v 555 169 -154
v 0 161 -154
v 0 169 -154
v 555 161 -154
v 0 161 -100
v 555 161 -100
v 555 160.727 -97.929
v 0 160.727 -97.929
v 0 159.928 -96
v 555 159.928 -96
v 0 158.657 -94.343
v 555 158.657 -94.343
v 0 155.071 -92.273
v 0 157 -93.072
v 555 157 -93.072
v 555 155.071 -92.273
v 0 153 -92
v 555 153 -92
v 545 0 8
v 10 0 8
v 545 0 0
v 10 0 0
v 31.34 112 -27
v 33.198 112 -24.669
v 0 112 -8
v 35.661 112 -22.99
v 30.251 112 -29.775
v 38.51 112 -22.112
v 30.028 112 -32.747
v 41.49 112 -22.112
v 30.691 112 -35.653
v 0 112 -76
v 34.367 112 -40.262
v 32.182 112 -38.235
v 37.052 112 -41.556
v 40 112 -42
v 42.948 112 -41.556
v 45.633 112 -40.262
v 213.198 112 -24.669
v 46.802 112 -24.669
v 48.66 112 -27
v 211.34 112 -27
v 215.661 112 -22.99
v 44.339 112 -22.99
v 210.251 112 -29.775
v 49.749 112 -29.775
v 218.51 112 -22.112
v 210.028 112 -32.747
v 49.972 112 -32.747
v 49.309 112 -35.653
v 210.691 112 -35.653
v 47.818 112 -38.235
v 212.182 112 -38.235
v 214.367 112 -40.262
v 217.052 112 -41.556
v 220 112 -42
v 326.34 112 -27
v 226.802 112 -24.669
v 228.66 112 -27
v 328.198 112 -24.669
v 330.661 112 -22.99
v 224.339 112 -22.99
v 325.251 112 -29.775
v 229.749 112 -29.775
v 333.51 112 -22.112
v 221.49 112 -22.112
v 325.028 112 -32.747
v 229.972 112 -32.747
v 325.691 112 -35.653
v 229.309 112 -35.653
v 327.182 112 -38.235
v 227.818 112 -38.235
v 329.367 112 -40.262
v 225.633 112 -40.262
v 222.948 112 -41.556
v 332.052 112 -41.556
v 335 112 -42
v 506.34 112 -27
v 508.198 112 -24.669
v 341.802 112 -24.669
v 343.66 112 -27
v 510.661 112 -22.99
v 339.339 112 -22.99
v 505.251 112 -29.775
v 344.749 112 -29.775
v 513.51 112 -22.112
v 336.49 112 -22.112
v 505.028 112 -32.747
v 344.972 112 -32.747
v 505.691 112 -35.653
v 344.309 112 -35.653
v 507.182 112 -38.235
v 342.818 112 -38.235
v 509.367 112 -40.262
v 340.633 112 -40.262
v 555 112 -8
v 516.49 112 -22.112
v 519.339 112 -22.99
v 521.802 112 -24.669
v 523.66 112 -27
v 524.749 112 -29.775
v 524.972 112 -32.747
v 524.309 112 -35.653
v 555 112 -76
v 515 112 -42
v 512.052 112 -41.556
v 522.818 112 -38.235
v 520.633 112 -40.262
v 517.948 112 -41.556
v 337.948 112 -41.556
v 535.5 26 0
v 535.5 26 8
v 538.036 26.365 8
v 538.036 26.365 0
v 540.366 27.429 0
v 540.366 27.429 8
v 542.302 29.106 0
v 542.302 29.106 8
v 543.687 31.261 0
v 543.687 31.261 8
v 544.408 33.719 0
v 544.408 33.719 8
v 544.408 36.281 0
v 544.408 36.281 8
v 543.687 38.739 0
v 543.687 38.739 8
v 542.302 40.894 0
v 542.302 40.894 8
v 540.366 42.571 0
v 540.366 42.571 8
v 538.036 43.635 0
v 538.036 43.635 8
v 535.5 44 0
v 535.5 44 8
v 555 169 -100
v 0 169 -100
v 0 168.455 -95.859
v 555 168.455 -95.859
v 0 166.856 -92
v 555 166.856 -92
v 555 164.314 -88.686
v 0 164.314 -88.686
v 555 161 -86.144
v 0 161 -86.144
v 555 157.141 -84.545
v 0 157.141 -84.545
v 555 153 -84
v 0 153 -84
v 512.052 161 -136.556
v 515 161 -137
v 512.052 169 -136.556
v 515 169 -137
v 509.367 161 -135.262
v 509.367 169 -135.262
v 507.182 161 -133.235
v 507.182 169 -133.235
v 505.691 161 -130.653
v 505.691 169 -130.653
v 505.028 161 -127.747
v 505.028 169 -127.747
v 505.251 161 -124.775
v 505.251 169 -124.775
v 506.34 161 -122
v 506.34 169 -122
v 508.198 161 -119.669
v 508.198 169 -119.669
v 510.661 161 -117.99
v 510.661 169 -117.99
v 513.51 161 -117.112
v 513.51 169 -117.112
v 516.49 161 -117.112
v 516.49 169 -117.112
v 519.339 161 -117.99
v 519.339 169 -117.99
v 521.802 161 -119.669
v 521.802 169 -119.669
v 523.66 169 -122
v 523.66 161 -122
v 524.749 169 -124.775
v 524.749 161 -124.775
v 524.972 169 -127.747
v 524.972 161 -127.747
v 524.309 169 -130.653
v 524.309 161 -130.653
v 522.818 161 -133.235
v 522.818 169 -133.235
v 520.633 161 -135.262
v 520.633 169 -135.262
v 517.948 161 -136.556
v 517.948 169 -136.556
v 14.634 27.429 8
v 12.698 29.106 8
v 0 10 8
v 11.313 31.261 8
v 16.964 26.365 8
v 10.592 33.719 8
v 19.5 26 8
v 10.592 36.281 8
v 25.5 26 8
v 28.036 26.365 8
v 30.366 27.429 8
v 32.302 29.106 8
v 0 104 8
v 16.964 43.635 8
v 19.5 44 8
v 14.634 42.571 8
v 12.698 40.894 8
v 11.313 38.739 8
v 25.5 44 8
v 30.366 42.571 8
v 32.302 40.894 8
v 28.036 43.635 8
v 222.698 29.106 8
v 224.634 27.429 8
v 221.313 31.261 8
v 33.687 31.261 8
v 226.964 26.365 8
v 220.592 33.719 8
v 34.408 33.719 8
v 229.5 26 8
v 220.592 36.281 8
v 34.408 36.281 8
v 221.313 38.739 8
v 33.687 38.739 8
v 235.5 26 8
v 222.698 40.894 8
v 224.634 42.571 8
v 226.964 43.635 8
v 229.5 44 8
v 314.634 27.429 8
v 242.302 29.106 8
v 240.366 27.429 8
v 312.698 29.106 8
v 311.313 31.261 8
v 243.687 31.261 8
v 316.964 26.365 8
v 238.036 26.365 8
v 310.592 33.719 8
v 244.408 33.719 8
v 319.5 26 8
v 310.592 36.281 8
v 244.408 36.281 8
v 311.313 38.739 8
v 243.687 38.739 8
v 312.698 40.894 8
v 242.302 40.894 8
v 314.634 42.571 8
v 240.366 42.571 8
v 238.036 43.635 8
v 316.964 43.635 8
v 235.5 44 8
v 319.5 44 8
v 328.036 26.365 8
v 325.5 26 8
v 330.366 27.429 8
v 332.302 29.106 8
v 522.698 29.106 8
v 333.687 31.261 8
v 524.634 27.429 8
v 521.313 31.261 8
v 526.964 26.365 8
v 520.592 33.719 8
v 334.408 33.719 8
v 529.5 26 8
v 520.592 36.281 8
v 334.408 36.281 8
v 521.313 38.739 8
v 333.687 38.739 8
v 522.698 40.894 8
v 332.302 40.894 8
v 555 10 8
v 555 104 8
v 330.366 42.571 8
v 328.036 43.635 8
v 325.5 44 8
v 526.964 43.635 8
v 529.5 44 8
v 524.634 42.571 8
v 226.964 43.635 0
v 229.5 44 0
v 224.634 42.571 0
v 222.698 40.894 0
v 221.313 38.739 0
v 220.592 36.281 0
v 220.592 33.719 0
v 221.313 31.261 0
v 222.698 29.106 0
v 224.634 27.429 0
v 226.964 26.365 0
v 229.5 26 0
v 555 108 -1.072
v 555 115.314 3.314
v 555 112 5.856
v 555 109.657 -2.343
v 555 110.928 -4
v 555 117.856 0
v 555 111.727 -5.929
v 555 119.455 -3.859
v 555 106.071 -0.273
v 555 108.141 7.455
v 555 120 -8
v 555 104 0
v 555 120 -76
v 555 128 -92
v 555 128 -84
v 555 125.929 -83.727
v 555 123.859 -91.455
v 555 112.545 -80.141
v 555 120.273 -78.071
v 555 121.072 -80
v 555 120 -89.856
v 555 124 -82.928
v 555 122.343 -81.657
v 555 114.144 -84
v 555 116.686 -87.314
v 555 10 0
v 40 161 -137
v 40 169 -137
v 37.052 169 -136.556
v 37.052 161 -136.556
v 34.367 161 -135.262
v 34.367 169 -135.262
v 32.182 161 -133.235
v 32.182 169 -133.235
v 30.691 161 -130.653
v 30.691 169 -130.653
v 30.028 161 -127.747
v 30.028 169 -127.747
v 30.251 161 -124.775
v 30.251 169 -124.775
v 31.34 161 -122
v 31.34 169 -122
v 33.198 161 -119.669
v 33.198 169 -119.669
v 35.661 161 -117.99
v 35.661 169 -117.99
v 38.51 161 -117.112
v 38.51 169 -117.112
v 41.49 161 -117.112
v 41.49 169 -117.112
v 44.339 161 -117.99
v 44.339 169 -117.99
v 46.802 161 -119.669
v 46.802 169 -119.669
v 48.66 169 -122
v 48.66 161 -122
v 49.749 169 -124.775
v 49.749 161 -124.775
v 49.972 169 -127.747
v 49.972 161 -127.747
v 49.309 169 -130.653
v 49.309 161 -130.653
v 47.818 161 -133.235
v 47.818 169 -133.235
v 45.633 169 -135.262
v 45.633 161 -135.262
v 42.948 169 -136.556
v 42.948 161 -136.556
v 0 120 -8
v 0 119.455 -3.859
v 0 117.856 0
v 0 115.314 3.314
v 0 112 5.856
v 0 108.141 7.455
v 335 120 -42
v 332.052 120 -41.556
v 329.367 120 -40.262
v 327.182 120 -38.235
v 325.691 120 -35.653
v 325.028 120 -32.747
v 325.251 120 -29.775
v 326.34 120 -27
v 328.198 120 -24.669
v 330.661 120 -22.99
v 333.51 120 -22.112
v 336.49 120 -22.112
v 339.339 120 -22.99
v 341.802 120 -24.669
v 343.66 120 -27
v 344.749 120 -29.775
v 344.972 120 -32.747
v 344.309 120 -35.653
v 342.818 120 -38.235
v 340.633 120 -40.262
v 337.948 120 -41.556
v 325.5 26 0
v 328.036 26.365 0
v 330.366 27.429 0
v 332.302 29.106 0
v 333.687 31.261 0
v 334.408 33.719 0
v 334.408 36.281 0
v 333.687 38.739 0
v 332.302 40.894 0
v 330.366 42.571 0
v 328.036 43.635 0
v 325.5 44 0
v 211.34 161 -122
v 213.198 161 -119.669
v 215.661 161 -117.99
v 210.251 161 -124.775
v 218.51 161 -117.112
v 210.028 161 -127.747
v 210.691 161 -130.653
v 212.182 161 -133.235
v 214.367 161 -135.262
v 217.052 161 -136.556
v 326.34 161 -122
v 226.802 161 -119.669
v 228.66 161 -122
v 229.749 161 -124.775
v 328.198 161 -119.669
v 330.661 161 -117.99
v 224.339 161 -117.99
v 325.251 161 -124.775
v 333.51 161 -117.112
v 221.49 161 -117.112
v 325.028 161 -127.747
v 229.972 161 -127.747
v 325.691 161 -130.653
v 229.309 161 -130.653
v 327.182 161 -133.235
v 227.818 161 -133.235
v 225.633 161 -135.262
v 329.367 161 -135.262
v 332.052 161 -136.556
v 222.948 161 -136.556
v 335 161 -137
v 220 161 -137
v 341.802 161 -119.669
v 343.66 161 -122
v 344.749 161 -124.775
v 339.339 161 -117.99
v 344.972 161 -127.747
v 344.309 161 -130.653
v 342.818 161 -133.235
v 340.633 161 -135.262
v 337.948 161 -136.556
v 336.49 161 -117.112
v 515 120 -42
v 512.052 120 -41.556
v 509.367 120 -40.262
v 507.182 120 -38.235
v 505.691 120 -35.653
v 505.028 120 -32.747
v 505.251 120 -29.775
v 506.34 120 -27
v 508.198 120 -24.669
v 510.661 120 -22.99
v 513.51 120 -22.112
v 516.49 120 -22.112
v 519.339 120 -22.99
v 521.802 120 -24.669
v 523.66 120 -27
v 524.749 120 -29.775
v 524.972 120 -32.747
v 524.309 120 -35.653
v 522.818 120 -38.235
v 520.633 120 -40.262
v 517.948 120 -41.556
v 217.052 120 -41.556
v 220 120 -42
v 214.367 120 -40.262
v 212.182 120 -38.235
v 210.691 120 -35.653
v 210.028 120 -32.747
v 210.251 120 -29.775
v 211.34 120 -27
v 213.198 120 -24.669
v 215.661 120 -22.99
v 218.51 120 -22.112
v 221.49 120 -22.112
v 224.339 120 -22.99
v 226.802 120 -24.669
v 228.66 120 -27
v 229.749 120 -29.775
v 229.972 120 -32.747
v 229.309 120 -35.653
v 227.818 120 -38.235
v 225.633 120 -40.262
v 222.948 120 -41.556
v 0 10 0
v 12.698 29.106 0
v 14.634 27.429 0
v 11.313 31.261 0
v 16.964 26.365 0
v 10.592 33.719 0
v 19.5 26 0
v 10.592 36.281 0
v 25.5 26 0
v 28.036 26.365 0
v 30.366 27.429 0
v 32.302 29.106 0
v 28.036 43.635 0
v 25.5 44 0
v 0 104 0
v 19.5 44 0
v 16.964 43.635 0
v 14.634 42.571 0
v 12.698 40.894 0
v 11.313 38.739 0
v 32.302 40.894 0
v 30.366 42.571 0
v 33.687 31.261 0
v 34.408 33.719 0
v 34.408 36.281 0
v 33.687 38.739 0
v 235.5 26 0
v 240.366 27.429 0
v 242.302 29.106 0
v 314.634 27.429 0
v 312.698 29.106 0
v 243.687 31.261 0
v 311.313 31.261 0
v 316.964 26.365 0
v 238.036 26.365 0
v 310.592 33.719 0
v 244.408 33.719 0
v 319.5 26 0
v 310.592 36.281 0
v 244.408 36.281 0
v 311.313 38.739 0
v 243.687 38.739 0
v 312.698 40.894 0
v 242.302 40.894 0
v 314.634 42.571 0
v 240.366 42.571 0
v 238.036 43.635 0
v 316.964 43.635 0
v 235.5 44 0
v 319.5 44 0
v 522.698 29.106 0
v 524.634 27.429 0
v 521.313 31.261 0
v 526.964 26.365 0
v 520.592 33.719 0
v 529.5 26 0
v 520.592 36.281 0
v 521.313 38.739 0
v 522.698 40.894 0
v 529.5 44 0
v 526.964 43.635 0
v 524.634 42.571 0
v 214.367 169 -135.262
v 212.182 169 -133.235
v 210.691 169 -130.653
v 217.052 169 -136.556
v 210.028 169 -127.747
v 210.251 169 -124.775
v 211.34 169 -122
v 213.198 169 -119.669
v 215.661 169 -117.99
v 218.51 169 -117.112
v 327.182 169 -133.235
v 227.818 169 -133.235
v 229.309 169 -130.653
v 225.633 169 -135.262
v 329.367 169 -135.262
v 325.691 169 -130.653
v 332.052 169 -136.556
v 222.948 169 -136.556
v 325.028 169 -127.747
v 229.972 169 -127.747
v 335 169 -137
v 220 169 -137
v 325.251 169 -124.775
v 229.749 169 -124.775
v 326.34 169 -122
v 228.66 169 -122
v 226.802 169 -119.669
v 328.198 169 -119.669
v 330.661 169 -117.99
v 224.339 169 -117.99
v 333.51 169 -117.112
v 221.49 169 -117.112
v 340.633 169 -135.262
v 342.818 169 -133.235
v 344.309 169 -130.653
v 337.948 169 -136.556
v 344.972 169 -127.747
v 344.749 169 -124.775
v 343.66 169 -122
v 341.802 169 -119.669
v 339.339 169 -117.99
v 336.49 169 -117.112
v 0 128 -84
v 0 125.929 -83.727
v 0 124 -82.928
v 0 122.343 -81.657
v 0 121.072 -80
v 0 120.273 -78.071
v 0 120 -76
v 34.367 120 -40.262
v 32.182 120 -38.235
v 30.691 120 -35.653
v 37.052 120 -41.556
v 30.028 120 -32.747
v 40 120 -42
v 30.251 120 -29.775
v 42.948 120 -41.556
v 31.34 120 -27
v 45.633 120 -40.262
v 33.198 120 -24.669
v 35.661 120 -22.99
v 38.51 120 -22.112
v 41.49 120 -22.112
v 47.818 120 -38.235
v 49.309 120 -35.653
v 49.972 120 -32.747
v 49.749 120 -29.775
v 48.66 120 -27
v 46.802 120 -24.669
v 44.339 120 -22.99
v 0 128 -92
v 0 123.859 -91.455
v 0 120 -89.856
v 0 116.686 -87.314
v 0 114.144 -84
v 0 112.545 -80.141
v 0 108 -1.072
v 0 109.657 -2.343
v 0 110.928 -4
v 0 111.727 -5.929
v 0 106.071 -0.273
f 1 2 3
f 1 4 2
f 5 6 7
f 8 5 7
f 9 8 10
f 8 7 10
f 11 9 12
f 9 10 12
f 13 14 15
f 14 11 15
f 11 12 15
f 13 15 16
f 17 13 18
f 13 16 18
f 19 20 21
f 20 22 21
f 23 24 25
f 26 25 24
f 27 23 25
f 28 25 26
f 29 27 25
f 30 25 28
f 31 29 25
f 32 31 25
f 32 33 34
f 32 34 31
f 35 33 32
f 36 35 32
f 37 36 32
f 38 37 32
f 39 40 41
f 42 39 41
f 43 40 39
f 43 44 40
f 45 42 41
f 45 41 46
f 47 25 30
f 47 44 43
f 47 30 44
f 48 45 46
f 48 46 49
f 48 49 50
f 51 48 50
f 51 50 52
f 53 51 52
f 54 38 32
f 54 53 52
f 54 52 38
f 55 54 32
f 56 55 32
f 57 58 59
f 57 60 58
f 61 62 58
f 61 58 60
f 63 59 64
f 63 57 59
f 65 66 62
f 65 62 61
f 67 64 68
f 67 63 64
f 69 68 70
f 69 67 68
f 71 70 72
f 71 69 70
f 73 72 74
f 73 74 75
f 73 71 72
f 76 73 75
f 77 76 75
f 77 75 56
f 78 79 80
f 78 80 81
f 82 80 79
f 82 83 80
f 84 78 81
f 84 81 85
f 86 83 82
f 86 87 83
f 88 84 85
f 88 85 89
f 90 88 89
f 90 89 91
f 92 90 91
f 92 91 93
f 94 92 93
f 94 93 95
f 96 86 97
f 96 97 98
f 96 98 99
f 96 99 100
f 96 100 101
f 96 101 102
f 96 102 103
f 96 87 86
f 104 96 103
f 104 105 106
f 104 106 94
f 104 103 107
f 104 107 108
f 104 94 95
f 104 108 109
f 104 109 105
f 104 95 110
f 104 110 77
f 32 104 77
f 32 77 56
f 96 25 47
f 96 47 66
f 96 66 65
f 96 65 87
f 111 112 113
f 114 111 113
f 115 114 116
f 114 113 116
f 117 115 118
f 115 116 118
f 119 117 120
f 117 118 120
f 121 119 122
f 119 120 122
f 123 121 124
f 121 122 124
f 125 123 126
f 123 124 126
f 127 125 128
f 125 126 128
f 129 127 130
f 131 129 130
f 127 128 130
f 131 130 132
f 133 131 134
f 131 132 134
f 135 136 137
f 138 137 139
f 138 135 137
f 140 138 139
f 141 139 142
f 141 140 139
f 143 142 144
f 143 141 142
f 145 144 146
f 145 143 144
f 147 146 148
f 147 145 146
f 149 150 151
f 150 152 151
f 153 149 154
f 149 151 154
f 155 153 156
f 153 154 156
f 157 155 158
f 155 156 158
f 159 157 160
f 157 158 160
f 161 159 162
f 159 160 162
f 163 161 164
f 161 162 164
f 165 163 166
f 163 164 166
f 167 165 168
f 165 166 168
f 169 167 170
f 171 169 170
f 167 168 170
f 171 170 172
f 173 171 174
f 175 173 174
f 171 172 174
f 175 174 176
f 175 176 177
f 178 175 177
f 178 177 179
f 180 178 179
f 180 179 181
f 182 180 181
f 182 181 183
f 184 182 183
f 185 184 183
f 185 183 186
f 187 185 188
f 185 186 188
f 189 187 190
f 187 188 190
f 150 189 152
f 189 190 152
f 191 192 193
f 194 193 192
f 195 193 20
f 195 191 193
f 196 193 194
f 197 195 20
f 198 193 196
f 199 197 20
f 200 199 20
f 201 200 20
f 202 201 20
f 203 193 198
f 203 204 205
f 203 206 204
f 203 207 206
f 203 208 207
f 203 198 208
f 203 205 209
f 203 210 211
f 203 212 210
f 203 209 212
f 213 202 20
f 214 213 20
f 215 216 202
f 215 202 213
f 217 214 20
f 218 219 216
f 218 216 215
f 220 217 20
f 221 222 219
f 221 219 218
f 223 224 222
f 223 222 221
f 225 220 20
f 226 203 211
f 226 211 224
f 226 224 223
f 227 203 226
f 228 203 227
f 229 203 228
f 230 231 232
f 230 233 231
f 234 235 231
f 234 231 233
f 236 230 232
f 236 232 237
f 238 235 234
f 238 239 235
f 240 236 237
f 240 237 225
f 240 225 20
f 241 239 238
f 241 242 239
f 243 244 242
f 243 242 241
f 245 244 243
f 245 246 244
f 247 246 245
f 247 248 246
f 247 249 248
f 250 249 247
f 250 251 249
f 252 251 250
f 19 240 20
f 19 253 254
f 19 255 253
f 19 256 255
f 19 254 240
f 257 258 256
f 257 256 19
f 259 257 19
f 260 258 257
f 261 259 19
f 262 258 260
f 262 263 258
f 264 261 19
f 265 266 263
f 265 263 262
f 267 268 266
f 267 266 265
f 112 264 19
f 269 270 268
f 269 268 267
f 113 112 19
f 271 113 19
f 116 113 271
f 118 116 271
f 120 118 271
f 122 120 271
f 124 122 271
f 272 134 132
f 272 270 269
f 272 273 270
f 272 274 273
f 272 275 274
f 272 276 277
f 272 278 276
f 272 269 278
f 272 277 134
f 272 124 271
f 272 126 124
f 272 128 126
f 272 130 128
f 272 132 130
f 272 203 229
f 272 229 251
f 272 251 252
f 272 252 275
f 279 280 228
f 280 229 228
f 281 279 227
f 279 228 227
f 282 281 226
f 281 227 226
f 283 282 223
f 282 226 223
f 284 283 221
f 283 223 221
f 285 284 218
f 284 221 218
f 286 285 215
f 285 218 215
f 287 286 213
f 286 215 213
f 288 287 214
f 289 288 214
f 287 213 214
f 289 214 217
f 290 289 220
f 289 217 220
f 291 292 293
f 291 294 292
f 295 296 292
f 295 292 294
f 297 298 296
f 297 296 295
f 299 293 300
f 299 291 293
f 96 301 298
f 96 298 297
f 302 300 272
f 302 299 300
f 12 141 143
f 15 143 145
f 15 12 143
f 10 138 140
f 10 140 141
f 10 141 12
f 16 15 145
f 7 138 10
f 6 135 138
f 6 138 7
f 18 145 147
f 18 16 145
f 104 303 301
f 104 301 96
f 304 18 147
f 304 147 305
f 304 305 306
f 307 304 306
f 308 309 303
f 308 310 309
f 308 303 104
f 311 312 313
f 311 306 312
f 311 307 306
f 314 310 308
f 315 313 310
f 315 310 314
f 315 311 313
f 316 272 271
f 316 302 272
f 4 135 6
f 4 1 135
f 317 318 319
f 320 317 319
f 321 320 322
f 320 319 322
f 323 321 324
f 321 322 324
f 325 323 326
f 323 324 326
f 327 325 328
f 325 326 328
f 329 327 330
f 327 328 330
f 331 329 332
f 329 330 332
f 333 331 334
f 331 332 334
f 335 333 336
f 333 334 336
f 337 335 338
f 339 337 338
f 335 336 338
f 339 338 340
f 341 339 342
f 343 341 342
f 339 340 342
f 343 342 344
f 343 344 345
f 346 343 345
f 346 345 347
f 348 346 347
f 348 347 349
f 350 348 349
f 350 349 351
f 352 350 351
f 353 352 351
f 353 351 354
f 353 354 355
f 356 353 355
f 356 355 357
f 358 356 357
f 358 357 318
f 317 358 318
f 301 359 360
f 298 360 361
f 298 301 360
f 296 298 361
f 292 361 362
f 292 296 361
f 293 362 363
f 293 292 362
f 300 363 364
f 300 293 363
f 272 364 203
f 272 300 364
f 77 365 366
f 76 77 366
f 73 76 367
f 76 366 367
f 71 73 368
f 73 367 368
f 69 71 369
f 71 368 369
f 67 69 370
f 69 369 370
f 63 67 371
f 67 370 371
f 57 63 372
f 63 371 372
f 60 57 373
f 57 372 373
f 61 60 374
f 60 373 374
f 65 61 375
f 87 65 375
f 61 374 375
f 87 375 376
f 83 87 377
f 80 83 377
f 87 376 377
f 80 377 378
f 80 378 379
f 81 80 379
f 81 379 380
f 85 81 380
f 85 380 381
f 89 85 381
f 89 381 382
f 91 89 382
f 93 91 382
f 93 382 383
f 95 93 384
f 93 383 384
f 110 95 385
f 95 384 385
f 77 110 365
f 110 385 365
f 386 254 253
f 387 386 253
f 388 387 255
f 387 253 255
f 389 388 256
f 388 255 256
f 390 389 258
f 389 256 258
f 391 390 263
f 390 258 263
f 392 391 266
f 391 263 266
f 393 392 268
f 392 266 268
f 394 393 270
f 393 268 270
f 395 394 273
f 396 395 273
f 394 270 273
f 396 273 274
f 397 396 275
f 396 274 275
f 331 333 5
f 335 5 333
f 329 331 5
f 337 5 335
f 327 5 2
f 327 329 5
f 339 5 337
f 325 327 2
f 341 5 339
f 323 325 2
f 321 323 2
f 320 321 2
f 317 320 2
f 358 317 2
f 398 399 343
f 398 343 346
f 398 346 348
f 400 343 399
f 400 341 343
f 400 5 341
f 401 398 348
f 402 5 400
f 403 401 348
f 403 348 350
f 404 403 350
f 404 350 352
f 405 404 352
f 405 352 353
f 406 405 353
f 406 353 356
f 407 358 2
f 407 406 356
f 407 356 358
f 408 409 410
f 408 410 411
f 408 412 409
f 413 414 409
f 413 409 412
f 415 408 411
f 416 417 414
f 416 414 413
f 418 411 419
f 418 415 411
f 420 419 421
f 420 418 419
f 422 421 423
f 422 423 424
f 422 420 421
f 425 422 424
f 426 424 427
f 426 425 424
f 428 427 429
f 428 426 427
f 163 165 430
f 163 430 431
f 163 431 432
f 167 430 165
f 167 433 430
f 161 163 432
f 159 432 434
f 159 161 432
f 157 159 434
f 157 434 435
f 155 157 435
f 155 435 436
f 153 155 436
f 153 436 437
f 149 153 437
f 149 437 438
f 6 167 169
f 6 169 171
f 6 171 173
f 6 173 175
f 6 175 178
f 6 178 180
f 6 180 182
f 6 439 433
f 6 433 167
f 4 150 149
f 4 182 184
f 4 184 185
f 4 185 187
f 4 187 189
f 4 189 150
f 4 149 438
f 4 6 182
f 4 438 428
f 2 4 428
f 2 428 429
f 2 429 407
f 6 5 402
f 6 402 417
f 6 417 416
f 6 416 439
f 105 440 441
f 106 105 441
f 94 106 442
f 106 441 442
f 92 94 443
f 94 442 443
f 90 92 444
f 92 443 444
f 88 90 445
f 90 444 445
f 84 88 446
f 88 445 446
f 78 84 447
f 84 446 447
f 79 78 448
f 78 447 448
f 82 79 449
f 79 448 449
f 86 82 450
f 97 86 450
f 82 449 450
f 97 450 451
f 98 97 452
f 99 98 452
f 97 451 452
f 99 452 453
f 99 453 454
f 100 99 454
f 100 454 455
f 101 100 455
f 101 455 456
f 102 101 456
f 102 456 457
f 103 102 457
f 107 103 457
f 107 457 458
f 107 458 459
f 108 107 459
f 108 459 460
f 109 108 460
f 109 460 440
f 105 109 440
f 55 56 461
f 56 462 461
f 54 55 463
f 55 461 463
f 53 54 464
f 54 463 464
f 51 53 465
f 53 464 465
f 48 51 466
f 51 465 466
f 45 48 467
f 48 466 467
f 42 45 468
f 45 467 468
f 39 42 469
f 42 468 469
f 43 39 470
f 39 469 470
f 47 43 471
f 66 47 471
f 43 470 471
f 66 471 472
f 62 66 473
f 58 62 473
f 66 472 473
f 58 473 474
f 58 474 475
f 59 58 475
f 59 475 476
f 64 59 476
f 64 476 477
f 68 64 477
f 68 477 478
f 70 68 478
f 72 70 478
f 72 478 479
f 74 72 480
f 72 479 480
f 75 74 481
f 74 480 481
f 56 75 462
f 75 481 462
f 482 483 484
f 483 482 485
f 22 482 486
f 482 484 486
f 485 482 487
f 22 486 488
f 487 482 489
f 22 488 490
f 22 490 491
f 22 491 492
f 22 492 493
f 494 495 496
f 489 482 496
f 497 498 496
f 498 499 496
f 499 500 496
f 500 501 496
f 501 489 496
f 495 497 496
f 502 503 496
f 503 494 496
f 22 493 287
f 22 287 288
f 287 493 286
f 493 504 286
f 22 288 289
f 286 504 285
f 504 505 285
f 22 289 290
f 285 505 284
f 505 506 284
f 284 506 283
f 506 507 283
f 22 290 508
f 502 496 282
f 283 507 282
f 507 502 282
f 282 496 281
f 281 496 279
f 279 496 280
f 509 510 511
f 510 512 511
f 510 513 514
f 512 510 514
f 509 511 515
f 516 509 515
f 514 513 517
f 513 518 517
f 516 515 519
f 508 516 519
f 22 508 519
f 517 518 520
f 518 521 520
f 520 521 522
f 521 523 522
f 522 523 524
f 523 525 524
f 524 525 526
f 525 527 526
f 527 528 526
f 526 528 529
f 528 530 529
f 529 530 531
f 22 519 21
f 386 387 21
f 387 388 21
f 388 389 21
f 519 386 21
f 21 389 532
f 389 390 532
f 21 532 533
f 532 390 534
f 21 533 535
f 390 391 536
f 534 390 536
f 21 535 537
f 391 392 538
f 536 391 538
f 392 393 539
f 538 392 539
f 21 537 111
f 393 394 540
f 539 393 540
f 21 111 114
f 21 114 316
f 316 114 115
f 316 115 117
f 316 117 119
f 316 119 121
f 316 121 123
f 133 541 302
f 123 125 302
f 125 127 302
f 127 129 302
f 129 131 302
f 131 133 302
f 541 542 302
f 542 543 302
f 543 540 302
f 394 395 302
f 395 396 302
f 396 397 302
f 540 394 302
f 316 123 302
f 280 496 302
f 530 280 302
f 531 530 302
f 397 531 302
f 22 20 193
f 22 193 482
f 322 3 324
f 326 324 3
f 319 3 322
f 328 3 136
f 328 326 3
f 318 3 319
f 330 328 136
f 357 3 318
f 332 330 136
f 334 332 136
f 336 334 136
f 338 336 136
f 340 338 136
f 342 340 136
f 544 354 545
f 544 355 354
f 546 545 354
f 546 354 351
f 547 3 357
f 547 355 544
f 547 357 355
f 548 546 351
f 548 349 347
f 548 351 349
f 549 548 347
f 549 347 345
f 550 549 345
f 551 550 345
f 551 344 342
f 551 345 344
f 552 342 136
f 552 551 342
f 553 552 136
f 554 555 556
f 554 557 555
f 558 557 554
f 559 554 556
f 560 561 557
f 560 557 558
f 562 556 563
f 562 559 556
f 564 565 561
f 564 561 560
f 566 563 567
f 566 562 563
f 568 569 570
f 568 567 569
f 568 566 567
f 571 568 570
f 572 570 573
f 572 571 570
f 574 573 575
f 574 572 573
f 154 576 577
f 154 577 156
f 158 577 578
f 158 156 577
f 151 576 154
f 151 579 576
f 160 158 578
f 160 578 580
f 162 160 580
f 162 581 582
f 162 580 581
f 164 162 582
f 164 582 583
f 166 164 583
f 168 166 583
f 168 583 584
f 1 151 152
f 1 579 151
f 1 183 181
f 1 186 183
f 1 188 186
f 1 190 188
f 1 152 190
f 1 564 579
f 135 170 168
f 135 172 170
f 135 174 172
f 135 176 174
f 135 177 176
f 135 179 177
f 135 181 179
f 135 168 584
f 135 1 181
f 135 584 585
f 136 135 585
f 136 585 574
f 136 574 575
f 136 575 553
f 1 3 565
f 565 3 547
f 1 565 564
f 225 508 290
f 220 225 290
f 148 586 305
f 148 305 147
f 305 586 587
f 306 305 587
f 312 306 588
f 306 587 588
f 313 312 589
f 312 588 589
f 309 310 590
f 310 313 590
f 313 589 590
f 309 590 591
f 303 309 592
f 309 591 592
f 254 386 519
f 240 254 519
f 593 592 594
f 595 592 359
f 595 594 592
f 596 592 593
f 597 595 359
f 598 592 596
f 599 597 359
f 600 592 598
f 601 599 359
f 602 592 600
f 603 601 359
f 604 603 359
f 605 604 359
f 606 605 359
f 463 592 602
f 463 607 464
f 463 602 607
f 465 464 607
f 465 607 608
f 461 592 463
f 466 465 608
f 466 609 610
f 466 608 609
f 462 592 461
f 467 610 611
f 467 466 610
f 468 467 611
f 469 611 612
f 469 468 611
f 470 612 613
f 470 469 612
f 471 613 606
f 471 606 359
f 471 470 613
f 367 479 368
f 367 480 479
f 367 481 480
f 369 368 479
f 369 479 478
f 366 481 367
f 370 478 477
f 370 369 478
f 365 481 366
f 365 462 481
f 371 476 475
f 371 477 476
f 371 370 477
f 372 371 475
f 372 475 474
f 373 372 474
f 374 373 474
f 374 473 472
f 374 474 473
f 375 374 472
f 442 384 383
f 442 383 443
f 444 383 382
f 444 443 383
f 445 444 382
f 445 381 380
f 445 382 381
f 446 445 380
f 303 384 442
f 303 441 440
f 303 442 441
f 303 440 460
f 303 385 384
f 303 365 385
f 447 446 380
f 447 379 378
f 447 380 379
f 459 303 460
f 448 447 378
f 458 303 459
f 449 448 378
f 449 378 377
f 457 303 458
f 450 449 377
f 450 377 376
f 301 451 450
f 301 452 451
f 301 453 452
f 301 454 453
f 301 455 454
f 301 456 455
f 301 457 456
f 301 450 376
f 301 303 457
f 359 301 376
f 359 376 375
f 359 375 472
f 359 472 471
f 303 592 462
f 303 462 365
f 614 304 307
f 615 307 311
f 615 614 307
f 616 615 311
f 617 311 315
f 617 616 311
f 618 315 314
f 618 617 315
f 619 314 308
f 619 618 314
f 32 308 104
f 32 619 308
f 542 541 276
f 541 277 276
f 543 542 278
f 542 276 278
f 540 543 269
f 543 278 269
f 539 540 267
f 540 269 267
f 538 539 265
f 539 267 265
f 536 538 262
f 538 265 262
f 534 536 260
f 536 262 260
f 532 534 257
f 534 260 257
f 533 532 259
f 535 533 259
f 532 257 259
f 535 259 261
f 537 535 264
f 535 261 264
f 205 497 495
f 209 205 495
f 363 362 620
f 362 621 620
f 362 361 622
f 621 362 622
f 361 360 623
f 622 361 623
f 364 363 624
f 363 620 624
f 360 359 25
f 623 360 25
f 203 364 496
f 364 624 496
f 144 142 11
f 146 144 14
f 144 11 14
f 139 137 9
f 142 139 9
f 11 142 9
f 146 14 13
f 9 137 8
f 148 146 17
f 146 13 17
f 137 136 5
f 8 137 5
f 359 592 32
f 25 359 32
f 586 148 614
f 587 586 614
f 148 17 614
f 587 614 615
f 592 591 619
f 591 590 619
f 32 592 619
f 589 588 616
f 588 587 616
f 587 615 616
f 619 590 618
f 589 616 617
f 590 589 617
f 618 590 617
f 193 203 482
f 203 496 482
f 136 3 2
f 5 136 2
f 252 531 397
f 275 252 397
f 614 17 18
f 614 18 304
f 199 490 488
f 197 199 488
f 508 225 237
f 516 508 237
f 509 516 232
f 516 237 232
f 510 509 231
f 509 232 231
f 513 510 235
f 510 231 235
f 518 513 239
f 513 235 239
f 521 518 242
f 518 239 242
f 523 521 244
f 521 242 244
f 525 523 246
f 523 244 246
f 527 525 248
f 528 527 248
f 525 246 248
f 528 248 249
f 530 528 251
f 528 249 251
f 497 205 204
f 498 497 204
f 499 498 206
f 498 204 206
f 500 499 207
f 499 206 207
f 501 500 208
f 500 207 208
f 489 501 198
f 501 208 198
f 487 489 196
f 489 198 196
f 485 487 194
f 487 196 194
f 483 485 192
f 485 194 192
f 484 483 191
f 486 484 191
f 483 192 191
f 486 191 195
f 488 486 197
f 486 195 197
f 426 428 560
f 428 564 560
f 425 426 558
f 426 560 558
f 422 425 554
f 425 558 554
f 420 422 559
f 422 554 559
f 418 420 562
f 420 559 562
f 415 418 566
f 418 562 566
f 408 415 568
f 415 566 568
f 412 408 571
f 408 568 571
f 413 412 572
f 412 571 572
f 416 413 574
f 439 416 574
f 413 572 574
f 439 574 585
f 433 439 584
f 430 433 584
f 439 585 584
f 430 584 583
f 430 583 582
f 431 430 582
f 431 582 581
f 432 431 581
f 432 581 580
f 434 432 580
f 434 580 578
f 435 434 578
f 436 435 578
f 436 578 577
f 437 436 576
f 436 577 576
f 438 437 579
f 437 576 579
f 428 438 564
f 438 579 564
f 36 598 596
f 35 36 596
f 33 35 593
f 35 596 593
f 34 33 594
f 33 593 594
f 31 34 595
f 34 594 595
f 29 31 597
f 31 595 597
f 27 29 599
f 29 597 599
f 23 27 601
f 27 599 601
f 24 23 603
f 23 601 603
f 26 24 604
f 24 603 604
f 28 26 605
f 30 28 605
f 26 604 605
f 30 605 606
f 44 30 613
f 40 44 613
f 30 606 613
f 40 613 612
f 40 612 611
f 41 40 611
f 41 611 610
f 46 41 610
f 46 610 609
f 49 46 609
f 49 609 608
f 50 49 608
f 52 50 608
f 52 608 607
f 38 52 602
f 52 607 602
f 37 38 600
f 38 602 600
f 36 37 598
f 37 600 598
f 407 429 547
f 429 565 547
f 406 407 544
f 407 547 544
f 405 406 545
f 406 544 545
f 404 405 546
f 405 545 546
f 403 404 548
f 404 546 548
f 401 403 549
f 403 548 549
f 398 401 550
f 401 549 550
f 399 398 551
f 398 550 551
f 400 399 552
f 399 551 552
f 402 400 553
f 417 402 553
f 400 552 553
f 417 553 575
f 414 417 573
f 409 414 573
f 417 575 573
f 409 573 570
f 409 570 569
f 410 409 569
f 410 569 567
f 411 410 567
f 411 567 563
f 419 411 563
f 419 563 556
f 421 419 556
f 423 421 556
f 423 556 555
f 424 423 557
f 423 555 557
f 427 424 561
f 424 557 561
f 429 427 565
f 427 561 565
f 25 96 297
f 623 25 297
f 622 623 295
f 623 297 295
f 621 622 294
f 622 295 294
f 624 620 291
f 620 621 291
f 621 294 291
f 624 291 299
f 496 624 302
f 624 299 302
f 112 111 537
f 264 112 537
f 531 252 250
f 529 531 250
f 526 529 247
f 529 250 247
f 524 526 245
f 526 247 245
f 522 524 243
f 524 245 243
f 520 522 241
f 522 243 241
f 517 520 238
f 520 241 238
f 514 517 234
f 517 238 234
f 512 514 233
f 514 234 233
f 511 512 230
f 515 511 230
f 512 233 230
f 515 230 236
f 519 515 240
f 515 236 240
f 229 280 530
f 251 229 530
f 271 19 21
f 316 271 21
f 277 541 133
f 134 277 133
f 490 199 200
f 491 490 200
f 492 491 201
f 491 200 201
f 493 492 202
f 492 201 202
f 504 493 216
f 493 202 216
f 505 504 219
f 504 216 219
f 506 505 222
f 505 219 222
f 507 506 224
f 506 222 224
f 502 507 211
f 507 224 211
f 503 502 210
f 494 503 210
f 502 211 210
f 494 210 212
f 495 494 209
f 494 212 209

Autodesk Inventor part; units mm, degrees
ref_plane "YZ Plane" through (0, 0, 0) normal (1, 0, 0) x (0, 1, 0)
ref_plane "XZ Plane" through (0, 0, 0) normal (0, 1, 0) x (-1, 0, 0)
ref_plane "XY Plane" through (0, 0, 0) normal (0, 0, 1) x (1, 0, 0)
sketch "Sketch1" plane through (0, 0, 0) normal (0, 0, 1) x (1, 0, 0)
  line L0 (0, 0) -> (555, 0)
  line L1 (555, 0) -> (555, 120)
  line L2 (555, 120) -> (0, 120)
  line L3 (0, 120) -> (0, 0)
  dimension "d0" = 120
  dimension "d1" = 555
extrude "Plate1" add sketch "Sketch1" along normal blind 8
sketch "Sketch2" plane through (555, 112, 8) normal (0, 1, 0) x (-1, 0, 0)
  line L0 (555, 0) -> (0, 0)
  line L1 (0, 0) -> (0, -100)
  line L2 (0, -100) -> (555, -100)
  line L3 (555, -100) -> (555, 0)
edge flange "Flange1" height 100 angle 90 thickness 8 bend radius 8 thickness toward (0, 1, 0) relief tear relief width 8 relief depth 4 edges at (277.5, 120, 0) wall of the first edge with corners at (0, 112, 8) (555, 112, 8) (555, 112, -92) (0, 112, -92)
bend "Bend1"
corner "Corner1"
sketch "Sketch3" plane through (0, 112, -92) normal (0, -1, 0) x (1, 0, 0)
  line L0 (0, 0) -> (0, 84) projected
  line L1 (0, 0) -> (555, 0) projected
  line L2 (555, 0) -> (555, 84) projected
  circle A0 centre (40, 60) radius 10
  circle A1 centre (515, 60) radius 10
  circle A2 centre (220, 60) radius 10
  circle A3 centre (335, 60) radius 10
  point P0 (0, 92)
  dimension "d13" = 20
  dimension "d14" = 20
  dimension "d15" = 40
  dimension "d16" = 60
  dimension "d17" = 60
  dimension "d18" = 40
  dimension "d19" = 20
  dimension "d20" = 180
  dimension "d21" = 20
  dimension "d22" = 180
  dimension "d23" = 60
  dimension "d24" = 60
hole "Hole1" at (40, 112, -32) at (220, 112, -32) at (335, 112, -32) at (515, 112, -32) direction (0, 1, 0) diameter 20 depth 8 tip angle 118
sketch "Sketch4" plane through (0, 0, 8) normal (0, 0, 1) x (1, 0, 0)
  circle A0 centre (544.5, 10.5) radius 1.1625 projected
  circle A1 centre (544.5, 59.5) radius 1.1625 projected
  arc A2 (535.5, 26) -> (535.5, 44) centre (535.5, 35) ccw projected
  line L0 (535.5, 26) -> (529.5, 26) projected
  arc A3 (529.5, 44) -> (529.5, 26) centre (529.5, 35) ccw projected
  line L1 (529.5, 44) -> (535.5, 44) projected
  line L2 (507.5, 26.468) -> (507.5, 43.532) projected
  arc A4 (505.7408, 21) -> (507.5, 26.468) centre (471.6029, 35) ccw projected
  line L3 (505.7408, 21) -> (482.22, 0) projected
  line L4 (482.22, 0) -> (545, 0) projected
  line L5 (545, 0) -> (553, 8) projected
  line L6 (553, 8) -> (553, 62) projected
  line L7 (553, 62) -> (545, 70) projected
  line L8 (482.22, 70) -> (545, 70) projected
  line L9 (482.22, 70) -> (505.7408, 49) projected
  arc A5 (507.5, 43.532) -> (505.7408, 49) centre (471.6029, 35) ccw projected
  circle A6 centre (310.5, 10.5) radius 1.1625 projected
  circle A7 centre (310.5, 59.5) radius 1.1625 projected
  arc A8 (325.5, 26) -> (325.5, 44) centre (325.5, 35) ccw projected
  line L10 (325.5, 26) -> (319.5, 26) projected
  arc A9 (319.5, 44) -> (319.5, 26) centre (319.5, 35) ccw projected
  line L11 (319.5, 44) -> (325.5, 44) projected
  line L12 (347.5, 26.468) -> (347.5, 43.532) projected
  arc A10 (349.2592, 49) -> (347.5, 43.532) centre (383.3971, 35) ccw projected
  line L13 (349.2592, 49) -> (372.78, 70) projected
  line L14 (372.78, 70) -> (310, 70) projected
  line L15 (310, 70) -> (302, 62) projected
  line L16 (302, 8) -> (302, 62) projected
  line L17 (302, 8) -> (310, 0) projected
  line L18 (372.78, 0) -> (310, 0) projected
  line L19 (372.78, 0) -> (349.2592, 21) projected
  arc A11 (347.5, 26.468) -> (349.2592, 21) centre (383.3971, 35) ccw projected
  circle A12 centre (244.5, 10.5) radius 1.1625 projected
  circle A13 centre (244.5, 59.5) radius 1.1625 projected
  arc A14 (235.5, 26) -> (235.5, 44) centre (235.5, 35) ccw projected
  line L20 (235.5, 26) -> (229.5, 26) projected
  arc A15 (229.5, 44) -> (229.5, 26) centre (229.5, 35) ccw projected
  line L21 (229.5, 44) -> (235.5, 44) projected
  line L22 (207.5, 26.468) -> (207.5, 43.532) projected
  arc A16 (205.7408, 21) -> (207.5, 26.468) centre (171.6029, 35) ccw projected
  line L23 (205.7408, 21) -> (182.22, 0) projected
  line L24 (182.22, 0) -> (245, 0) projected
  line L25 (245, 0) -> (253, 8) projected
  line L26 (253, 8) -> (253, 62) projected
  line L27 (253, 62) -> (245, 70) projected
  line L28 (182.22, 70) -> (245, 70) projected
  line L29 (182.22, 70) -> (205.7408, 49) projected
  arc A17 (207.5, 43.532) -> (205.7408, 49) centre (171.6029, 35) ccw projected
  circle A18 centre (10.5, 10.5) radius 1.1625 projected
  circle A19 centre (10.5, 59.5) radius 1.1625 projected
  arc A20 (25.5, 26) -> (25.5, 44) centre (25.5, 35) ccw projected
  line L30 (25.5, 26) -> (19.5, 26) projected
  arc A21 (19.5, 44) -> (19.5, 26) centre (19.5, 35) ccw projected
  line L31 (19.5, 44) -> (25.5, 44) projected
  line L32 (47.5, 26.468) -> (47.5, 43.532) projected
  arc A22 (49.2592, 49) -> (47.5, 43.532) centre (83.3971, 35) ccw projected
  line L33 (49.2592, 49) -> (72.78, 70) projected
  line L34 (72.78, 70) -> (10, 70) projected
  line L35 (10, 70) -> (2, 62) projected
  line L36 (2, 8) -> (2, 62) projected
  line L37 (2, 8) -> (10, 0) projected
  line L38 (72.78, 0) -> (10, 0) projected
  line L39 (72.78, 0) -> (49.2592, 21) projected
  arc A23 (47.5, 26.468) -> (49.2592, 21) centre (83.3971, 35) ccw projected
extrude "Extrusion1" cut sketch "Sketch4" against normal blind 10 contours L0 A3 L1 A2 | L10 A9 L11 A8 | L20 A15 L21 A14 | L30 A21 L31 A20
chamfer "Corner Chamfer1" distance 10 angle 45 2 edges at (555, 0, 4) (0, 0, 4)
sketch "Sketch5" plane through (0, 112, -84) normal (0, 0, -1) x (-1, 0, 0)
  line L0 (-555, 0) -> (0, 0)
  line L1 (0, 0) -> (0, 57)
  line L2 (0, 57) -> (-555, 57)
  line L3 (-555, 57) -> (-555, 0)
edge flange "Flange2" height 57 angle 90 thickness 8 bend radius 8 thickness toward (0, 0, -1) relief tear relief width 8 relief depth 4 edges at (277.5, 120, -92) wall of the first edge with corners at (555, 112, -84) (0, 112, -84) (0, 169, -84) (555, 169, -84)
bend "Bend2"
corner "Corner2"
sketch "Sketch6" plane through (555, 161, -84) normal (0, 1, 0) x (-1, 0, 0)
  line L0 (555, 0) -> (0, 0)
  line L1 (0, 0) -> (0, -70)
  line L2 (0, -70) -> (555, -70)
  line L3 (555, -70) -> (555, 0)
edge flange "Flange3" height 70 angle 90 thickness 8 bend radius 8 thickness toward (0, 1, 0) relief tear relief width 8 relief depth 4 edges at (277.5, 169, -92) wall of the first edge with corners at (0, 161, -84) (555, 161, -84) (555, 161, -154) (0, 161, -154)
bend "Bend3"
corner "Corner3"
sketch "Sketch7" plane through (0, 161, -154) normal (0, -1, 0) x (1, 0, 0)
  line L0 (0, 0) -> (0, 54) projected
  line L1 (0, 0) -> (555, 0) projected
  line L2 (555, 0) -> (555, 54) projected
  circle A0 centre (40, 27) radius 10
  circle A1 centre (515, 27) radius 10
  circle A2 centre (220, 27) radius 10
  circle A3 centre (335, 27) radius 10
  point P0 (0, 154)
  dimension "d57" = 20
  dimension "d58" = 40
  dimension "d59" = 27
  dimension "d60" = 20
  dimension "d61" = 40
  dimension "d62" = 27
  dimension "d63" = 20
  dimension "d64" = 20
  dimension "d65" = 180
  dimension "d66" = 27
  dimension "d67" = 180
  dimension "d68" = 27
hole "Hole2" at (40, 161, -127) at (220, 161, -127) at (335, 161, -127) at (515, 161, -127) direction (0, 1, 0) diameter 20 depth 8 tip angle 118
equation "\"d30\" = Thickness"
equation "\"d74\" = Thickness"
equation "\"d3\" = BendReliefWidth"
equation "\"d4\" = BendReliefDepth"
equation "\"d5\" = MinimumRemnant"
equation "\"d6\" = BendRadius"
equation "\"d9\" = BendRadius"
equation "\"d10\" = CornerReliefSize"
equation "\"d11\" = GapSize"
equation "\"d12\" = JacobiRadiusSize"
equation "\"d37\" = BendReliefWidth"
equation "\"d38\" = BendReliefDepth"
equation "\"d39\" = MinimumRemnant"
equation "\"d40\" = BendRadius"
equation "\"d43\" = BendRadius"
equation "\"d44\" = CornerReliefSize"
equation "\"d45\" = GapSize"
equation "\"d46\" = JacobiRadiusSize"
equation "\"d47\" = BendReliefWidth"
equation "\"d48\" = BendReliefDepth"
equation "\"d49\" = MinimumRemnant"
equation "\"d50\" = BendRadius"
equation "\"d53\" = BendRadius"
equation "\"d54\" = CornerReliefSize"
equation "\"d55\" = GapSize"
equation "\"d56\" = JacobiRadiusSize"
equation "\"BendRadius\" = Thickness"
equation "\"BendReliefWidth\" = Thickness"
equation "\"BendReliefDepth\" = 0.5 * Thickness"
equation "\"CornerReliefSize\" = 4 * Thickness"
equation "\"MinimumRemnant\" = 2 * Thickness"
equation "\"TransitionRadius\" = BendRadius"
equation "\"JacobiRadiusSize\" = BendRadius"
equation "\"GapSize\" = Thickness"
equation "\"d2\" = BendRadius"
equation "\"Thickness\" = 8"
properties part number "Bearing Base"
